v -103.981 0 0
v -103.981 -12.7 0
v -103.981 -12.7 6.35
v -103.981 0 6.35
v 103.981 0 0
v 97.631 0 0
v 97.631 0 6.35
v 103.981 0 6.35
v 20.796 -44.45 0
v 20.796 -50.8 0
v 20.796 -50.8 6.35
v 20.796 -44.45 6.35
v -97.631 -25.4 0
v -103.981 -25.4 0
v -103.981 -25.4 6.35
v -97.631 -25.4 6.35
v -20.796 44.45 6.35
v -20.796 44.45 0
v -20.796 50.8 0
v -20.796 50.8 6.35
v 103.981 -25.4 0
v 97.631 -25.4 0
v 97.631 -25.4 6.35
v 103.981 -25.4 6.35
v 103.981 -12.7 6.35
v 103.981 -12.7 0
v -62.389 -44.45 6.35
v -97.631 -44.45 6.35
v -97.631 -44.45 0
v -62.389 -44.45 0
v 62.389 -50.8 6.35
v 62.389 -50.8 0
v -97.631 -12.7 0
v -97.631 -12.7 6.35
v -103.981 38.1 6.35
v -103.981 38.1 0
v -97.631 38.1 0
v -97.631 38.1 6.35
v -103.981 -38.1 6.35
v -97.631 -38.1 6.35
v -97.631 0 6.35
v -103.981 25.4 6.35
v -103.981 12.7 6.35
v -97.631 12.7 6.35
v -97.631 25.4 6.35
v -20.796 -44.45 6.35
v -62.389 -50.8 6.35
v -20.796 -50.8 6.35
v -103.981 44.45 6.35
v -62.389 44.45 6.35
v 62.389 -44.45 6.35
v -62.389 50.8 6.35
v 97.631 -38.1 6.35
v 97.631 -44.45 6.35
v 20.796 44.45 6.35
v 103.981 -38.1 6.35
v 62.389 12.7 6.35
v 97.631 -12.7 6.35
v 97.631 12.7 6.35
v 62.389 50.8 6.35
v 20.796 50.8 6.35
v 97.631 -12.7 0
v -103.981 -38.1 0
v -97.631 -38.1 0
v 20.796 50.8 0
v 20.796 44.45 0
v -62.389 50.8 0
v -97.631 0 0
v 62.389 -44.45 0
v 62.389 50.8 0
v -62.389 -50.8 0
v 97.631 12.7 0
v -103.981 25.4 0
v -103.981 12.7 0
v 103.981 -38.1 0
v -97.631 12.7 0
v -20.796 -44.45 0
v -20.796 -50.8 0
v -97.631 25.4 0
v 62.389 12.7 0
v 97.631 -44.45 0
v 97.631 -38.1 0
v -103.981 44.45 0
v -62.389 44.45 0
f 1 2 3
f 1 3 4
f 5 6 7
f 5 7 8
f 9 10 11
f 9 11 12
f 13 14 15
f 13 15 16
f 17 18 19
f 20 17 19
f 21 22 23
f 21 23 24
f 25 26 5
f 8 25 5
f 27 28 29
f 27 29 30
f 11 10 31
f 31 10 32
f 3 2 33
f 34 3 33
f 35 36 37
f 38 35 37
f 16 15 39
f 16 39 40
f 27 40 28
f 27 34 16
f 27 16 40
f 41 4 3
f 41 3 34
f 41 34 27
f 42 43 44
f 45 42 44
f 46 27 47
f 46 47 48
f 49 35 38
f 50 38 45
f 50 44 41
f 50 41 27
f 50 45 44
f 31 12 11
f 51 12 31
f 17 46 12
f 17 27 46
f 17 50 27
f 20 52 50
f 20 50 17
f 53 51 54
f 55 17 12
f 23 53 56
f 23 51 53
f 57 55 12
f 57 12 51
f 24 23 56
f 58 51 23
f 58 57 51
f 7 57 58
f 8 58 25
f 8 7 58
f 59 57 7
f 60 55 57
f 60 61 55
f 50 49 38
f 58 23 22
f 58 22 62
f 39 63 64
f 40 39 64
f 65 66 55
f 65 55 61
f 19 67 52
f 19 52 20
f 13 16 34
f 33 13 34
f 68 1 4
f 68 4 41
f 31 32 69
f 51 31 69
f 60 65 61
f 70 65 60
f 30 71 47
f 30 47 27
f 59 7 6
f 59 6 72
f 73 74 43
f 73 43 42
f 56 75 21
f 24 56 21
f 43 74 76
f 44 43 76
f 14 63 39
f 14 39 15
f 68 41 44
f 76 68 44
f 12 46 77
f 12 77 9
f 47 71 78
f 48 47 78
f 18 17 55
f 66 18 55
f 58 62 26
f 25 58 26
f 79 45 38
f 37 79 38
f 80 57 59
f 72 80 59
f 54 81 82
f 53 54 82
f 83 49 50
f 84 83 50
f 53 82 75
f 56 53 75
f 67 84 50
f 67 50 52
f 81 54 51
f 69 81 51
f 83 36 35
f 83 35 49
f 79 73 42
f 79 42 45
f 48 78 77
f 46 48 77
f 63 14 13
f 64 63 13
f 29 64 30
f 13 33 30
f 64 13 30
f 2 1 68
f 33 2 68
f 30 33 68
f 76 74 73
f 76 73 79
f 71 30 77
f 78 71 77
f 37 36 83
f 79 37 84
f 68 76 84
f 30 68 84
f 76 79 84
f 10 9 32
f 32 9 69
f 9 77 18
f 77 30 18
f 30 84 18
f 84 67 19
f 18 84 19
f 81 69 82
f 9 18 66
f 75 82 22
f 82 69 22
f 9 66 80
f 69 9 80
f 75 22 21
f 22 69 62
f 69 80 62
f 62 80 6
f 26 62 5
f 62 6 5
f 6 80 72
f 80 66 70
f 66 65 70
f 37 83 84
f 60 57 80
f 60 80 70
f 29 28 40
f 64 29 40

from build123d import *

# Parameters (mm, degrees)
SKETCH1_W           = 207.9625
SKETCH1_H           = 101.6
BOSS_EXTRUDE1_DEPTH = 6.35
SKETCH2_W           = 41.5925
SKETCH2_H           = 6.35
SKETCH2_W_2         = 35.2425
SKETCH2_W_3         = 6.35
SKETCH2_H_2         = 12.7
CUT_EXTRUDE1_DEPTH  = 6.35
SKETCH3_W           = 41.5925
SKETCH3_H           = 31.75
CUT_EXTRUDE2_DEPTH  = 6.35


with BuildPart() as part:
    # Sketch1 → Boss-Extrude1 (new body)
    with BuildSketch(Plane.XY):
        Rectangle(SKETCH1_W, SKETCH1_H)
    extrude(amount=BOSS_EXTRUDE1_DEPTH)

    # Sketch2 → Cut-Extrude1 (cut)
    with BuildSketch(Plane.XY.offset(6.35)):
        with Locations((0, 47.625)):
            Rectangle(SKETCH2_W, SKETCH2_H)
        with Locations((-83.185, 47.625)):
            Rectangle(SKETCH2_W, SKETCH2_H)
        with Locations((83.185, 47.625)):
            Rectangle(SKETCH2_W, SKETCH2_H)
        with Locations((80.01, -47.625)):
            Rectangle(SKETCH2_W_2, SKETCH2_H)
        with Locations((100.80625, -47.625)):
            Rectangle(SKETCH2_W_3, SKETCH2_H)
        with Locations((100.80625, -41.275)):
            Rectangle(SKETCH2_W_3, SKETCH2_H)
        with Locations((0, -47.625)):
            Rectangle(SKETCH2_W, SKETCH2_H)
        with Locations((-100.80625, -41.275)):
            Rectangle(SKETCH2_W_3, SKETCH2_H)
        with Locations((-100.80625, -47.625)):
            Rectangle(SKETCH2_W_3, SKETCH2_H)
        with Locations((-80.01, -47.625)):
            Rectangle(SKETCH2_W_2, SKETCH2_H)
        with Locations((-100.80625, 31.75)):
            Rectangle(SKETCH2_W_3, SKETCH2_H_2)
        with Locations((-100.80625, 6.35)):
            Rectangle(SKETCH2_W_3, SKETCH2_H_2)
        with Locations((-100.80625, -19.05)):
            Rectangle(SKETCH2_W_3, SKETCH2_H_2)
        with Locations((100.80625, -19.05)):
            Rectangle(SKETCH2_W_3, SKETCH2_H_2)
        with Locations((100.80625, 6.35)):
            Rectangle(SKETCH2_W_3, SKETCH2_H_2)
        with Locations((100.80625, 31.75)):
            Rectangle(SKETCH2_W_3, SKETCH2_H_2)
    extrude(amount=-CUT_EXTRUDE1_DEPTH, mode=Mode.SUBTRACT)

    # Sketch3 → Cut-Extrude2 (cut)
    with BuildSketch(Plane.XY.offset(6.35)):
        with Locations((83.185, 28.575)):
            Rectangle(SKETCH3_W, SKETCH3_H)
    extrude(amount=-CUT_EXTRUDE2_DEPTH, mode=Mode.SUBTRACT)


solid = part.part
